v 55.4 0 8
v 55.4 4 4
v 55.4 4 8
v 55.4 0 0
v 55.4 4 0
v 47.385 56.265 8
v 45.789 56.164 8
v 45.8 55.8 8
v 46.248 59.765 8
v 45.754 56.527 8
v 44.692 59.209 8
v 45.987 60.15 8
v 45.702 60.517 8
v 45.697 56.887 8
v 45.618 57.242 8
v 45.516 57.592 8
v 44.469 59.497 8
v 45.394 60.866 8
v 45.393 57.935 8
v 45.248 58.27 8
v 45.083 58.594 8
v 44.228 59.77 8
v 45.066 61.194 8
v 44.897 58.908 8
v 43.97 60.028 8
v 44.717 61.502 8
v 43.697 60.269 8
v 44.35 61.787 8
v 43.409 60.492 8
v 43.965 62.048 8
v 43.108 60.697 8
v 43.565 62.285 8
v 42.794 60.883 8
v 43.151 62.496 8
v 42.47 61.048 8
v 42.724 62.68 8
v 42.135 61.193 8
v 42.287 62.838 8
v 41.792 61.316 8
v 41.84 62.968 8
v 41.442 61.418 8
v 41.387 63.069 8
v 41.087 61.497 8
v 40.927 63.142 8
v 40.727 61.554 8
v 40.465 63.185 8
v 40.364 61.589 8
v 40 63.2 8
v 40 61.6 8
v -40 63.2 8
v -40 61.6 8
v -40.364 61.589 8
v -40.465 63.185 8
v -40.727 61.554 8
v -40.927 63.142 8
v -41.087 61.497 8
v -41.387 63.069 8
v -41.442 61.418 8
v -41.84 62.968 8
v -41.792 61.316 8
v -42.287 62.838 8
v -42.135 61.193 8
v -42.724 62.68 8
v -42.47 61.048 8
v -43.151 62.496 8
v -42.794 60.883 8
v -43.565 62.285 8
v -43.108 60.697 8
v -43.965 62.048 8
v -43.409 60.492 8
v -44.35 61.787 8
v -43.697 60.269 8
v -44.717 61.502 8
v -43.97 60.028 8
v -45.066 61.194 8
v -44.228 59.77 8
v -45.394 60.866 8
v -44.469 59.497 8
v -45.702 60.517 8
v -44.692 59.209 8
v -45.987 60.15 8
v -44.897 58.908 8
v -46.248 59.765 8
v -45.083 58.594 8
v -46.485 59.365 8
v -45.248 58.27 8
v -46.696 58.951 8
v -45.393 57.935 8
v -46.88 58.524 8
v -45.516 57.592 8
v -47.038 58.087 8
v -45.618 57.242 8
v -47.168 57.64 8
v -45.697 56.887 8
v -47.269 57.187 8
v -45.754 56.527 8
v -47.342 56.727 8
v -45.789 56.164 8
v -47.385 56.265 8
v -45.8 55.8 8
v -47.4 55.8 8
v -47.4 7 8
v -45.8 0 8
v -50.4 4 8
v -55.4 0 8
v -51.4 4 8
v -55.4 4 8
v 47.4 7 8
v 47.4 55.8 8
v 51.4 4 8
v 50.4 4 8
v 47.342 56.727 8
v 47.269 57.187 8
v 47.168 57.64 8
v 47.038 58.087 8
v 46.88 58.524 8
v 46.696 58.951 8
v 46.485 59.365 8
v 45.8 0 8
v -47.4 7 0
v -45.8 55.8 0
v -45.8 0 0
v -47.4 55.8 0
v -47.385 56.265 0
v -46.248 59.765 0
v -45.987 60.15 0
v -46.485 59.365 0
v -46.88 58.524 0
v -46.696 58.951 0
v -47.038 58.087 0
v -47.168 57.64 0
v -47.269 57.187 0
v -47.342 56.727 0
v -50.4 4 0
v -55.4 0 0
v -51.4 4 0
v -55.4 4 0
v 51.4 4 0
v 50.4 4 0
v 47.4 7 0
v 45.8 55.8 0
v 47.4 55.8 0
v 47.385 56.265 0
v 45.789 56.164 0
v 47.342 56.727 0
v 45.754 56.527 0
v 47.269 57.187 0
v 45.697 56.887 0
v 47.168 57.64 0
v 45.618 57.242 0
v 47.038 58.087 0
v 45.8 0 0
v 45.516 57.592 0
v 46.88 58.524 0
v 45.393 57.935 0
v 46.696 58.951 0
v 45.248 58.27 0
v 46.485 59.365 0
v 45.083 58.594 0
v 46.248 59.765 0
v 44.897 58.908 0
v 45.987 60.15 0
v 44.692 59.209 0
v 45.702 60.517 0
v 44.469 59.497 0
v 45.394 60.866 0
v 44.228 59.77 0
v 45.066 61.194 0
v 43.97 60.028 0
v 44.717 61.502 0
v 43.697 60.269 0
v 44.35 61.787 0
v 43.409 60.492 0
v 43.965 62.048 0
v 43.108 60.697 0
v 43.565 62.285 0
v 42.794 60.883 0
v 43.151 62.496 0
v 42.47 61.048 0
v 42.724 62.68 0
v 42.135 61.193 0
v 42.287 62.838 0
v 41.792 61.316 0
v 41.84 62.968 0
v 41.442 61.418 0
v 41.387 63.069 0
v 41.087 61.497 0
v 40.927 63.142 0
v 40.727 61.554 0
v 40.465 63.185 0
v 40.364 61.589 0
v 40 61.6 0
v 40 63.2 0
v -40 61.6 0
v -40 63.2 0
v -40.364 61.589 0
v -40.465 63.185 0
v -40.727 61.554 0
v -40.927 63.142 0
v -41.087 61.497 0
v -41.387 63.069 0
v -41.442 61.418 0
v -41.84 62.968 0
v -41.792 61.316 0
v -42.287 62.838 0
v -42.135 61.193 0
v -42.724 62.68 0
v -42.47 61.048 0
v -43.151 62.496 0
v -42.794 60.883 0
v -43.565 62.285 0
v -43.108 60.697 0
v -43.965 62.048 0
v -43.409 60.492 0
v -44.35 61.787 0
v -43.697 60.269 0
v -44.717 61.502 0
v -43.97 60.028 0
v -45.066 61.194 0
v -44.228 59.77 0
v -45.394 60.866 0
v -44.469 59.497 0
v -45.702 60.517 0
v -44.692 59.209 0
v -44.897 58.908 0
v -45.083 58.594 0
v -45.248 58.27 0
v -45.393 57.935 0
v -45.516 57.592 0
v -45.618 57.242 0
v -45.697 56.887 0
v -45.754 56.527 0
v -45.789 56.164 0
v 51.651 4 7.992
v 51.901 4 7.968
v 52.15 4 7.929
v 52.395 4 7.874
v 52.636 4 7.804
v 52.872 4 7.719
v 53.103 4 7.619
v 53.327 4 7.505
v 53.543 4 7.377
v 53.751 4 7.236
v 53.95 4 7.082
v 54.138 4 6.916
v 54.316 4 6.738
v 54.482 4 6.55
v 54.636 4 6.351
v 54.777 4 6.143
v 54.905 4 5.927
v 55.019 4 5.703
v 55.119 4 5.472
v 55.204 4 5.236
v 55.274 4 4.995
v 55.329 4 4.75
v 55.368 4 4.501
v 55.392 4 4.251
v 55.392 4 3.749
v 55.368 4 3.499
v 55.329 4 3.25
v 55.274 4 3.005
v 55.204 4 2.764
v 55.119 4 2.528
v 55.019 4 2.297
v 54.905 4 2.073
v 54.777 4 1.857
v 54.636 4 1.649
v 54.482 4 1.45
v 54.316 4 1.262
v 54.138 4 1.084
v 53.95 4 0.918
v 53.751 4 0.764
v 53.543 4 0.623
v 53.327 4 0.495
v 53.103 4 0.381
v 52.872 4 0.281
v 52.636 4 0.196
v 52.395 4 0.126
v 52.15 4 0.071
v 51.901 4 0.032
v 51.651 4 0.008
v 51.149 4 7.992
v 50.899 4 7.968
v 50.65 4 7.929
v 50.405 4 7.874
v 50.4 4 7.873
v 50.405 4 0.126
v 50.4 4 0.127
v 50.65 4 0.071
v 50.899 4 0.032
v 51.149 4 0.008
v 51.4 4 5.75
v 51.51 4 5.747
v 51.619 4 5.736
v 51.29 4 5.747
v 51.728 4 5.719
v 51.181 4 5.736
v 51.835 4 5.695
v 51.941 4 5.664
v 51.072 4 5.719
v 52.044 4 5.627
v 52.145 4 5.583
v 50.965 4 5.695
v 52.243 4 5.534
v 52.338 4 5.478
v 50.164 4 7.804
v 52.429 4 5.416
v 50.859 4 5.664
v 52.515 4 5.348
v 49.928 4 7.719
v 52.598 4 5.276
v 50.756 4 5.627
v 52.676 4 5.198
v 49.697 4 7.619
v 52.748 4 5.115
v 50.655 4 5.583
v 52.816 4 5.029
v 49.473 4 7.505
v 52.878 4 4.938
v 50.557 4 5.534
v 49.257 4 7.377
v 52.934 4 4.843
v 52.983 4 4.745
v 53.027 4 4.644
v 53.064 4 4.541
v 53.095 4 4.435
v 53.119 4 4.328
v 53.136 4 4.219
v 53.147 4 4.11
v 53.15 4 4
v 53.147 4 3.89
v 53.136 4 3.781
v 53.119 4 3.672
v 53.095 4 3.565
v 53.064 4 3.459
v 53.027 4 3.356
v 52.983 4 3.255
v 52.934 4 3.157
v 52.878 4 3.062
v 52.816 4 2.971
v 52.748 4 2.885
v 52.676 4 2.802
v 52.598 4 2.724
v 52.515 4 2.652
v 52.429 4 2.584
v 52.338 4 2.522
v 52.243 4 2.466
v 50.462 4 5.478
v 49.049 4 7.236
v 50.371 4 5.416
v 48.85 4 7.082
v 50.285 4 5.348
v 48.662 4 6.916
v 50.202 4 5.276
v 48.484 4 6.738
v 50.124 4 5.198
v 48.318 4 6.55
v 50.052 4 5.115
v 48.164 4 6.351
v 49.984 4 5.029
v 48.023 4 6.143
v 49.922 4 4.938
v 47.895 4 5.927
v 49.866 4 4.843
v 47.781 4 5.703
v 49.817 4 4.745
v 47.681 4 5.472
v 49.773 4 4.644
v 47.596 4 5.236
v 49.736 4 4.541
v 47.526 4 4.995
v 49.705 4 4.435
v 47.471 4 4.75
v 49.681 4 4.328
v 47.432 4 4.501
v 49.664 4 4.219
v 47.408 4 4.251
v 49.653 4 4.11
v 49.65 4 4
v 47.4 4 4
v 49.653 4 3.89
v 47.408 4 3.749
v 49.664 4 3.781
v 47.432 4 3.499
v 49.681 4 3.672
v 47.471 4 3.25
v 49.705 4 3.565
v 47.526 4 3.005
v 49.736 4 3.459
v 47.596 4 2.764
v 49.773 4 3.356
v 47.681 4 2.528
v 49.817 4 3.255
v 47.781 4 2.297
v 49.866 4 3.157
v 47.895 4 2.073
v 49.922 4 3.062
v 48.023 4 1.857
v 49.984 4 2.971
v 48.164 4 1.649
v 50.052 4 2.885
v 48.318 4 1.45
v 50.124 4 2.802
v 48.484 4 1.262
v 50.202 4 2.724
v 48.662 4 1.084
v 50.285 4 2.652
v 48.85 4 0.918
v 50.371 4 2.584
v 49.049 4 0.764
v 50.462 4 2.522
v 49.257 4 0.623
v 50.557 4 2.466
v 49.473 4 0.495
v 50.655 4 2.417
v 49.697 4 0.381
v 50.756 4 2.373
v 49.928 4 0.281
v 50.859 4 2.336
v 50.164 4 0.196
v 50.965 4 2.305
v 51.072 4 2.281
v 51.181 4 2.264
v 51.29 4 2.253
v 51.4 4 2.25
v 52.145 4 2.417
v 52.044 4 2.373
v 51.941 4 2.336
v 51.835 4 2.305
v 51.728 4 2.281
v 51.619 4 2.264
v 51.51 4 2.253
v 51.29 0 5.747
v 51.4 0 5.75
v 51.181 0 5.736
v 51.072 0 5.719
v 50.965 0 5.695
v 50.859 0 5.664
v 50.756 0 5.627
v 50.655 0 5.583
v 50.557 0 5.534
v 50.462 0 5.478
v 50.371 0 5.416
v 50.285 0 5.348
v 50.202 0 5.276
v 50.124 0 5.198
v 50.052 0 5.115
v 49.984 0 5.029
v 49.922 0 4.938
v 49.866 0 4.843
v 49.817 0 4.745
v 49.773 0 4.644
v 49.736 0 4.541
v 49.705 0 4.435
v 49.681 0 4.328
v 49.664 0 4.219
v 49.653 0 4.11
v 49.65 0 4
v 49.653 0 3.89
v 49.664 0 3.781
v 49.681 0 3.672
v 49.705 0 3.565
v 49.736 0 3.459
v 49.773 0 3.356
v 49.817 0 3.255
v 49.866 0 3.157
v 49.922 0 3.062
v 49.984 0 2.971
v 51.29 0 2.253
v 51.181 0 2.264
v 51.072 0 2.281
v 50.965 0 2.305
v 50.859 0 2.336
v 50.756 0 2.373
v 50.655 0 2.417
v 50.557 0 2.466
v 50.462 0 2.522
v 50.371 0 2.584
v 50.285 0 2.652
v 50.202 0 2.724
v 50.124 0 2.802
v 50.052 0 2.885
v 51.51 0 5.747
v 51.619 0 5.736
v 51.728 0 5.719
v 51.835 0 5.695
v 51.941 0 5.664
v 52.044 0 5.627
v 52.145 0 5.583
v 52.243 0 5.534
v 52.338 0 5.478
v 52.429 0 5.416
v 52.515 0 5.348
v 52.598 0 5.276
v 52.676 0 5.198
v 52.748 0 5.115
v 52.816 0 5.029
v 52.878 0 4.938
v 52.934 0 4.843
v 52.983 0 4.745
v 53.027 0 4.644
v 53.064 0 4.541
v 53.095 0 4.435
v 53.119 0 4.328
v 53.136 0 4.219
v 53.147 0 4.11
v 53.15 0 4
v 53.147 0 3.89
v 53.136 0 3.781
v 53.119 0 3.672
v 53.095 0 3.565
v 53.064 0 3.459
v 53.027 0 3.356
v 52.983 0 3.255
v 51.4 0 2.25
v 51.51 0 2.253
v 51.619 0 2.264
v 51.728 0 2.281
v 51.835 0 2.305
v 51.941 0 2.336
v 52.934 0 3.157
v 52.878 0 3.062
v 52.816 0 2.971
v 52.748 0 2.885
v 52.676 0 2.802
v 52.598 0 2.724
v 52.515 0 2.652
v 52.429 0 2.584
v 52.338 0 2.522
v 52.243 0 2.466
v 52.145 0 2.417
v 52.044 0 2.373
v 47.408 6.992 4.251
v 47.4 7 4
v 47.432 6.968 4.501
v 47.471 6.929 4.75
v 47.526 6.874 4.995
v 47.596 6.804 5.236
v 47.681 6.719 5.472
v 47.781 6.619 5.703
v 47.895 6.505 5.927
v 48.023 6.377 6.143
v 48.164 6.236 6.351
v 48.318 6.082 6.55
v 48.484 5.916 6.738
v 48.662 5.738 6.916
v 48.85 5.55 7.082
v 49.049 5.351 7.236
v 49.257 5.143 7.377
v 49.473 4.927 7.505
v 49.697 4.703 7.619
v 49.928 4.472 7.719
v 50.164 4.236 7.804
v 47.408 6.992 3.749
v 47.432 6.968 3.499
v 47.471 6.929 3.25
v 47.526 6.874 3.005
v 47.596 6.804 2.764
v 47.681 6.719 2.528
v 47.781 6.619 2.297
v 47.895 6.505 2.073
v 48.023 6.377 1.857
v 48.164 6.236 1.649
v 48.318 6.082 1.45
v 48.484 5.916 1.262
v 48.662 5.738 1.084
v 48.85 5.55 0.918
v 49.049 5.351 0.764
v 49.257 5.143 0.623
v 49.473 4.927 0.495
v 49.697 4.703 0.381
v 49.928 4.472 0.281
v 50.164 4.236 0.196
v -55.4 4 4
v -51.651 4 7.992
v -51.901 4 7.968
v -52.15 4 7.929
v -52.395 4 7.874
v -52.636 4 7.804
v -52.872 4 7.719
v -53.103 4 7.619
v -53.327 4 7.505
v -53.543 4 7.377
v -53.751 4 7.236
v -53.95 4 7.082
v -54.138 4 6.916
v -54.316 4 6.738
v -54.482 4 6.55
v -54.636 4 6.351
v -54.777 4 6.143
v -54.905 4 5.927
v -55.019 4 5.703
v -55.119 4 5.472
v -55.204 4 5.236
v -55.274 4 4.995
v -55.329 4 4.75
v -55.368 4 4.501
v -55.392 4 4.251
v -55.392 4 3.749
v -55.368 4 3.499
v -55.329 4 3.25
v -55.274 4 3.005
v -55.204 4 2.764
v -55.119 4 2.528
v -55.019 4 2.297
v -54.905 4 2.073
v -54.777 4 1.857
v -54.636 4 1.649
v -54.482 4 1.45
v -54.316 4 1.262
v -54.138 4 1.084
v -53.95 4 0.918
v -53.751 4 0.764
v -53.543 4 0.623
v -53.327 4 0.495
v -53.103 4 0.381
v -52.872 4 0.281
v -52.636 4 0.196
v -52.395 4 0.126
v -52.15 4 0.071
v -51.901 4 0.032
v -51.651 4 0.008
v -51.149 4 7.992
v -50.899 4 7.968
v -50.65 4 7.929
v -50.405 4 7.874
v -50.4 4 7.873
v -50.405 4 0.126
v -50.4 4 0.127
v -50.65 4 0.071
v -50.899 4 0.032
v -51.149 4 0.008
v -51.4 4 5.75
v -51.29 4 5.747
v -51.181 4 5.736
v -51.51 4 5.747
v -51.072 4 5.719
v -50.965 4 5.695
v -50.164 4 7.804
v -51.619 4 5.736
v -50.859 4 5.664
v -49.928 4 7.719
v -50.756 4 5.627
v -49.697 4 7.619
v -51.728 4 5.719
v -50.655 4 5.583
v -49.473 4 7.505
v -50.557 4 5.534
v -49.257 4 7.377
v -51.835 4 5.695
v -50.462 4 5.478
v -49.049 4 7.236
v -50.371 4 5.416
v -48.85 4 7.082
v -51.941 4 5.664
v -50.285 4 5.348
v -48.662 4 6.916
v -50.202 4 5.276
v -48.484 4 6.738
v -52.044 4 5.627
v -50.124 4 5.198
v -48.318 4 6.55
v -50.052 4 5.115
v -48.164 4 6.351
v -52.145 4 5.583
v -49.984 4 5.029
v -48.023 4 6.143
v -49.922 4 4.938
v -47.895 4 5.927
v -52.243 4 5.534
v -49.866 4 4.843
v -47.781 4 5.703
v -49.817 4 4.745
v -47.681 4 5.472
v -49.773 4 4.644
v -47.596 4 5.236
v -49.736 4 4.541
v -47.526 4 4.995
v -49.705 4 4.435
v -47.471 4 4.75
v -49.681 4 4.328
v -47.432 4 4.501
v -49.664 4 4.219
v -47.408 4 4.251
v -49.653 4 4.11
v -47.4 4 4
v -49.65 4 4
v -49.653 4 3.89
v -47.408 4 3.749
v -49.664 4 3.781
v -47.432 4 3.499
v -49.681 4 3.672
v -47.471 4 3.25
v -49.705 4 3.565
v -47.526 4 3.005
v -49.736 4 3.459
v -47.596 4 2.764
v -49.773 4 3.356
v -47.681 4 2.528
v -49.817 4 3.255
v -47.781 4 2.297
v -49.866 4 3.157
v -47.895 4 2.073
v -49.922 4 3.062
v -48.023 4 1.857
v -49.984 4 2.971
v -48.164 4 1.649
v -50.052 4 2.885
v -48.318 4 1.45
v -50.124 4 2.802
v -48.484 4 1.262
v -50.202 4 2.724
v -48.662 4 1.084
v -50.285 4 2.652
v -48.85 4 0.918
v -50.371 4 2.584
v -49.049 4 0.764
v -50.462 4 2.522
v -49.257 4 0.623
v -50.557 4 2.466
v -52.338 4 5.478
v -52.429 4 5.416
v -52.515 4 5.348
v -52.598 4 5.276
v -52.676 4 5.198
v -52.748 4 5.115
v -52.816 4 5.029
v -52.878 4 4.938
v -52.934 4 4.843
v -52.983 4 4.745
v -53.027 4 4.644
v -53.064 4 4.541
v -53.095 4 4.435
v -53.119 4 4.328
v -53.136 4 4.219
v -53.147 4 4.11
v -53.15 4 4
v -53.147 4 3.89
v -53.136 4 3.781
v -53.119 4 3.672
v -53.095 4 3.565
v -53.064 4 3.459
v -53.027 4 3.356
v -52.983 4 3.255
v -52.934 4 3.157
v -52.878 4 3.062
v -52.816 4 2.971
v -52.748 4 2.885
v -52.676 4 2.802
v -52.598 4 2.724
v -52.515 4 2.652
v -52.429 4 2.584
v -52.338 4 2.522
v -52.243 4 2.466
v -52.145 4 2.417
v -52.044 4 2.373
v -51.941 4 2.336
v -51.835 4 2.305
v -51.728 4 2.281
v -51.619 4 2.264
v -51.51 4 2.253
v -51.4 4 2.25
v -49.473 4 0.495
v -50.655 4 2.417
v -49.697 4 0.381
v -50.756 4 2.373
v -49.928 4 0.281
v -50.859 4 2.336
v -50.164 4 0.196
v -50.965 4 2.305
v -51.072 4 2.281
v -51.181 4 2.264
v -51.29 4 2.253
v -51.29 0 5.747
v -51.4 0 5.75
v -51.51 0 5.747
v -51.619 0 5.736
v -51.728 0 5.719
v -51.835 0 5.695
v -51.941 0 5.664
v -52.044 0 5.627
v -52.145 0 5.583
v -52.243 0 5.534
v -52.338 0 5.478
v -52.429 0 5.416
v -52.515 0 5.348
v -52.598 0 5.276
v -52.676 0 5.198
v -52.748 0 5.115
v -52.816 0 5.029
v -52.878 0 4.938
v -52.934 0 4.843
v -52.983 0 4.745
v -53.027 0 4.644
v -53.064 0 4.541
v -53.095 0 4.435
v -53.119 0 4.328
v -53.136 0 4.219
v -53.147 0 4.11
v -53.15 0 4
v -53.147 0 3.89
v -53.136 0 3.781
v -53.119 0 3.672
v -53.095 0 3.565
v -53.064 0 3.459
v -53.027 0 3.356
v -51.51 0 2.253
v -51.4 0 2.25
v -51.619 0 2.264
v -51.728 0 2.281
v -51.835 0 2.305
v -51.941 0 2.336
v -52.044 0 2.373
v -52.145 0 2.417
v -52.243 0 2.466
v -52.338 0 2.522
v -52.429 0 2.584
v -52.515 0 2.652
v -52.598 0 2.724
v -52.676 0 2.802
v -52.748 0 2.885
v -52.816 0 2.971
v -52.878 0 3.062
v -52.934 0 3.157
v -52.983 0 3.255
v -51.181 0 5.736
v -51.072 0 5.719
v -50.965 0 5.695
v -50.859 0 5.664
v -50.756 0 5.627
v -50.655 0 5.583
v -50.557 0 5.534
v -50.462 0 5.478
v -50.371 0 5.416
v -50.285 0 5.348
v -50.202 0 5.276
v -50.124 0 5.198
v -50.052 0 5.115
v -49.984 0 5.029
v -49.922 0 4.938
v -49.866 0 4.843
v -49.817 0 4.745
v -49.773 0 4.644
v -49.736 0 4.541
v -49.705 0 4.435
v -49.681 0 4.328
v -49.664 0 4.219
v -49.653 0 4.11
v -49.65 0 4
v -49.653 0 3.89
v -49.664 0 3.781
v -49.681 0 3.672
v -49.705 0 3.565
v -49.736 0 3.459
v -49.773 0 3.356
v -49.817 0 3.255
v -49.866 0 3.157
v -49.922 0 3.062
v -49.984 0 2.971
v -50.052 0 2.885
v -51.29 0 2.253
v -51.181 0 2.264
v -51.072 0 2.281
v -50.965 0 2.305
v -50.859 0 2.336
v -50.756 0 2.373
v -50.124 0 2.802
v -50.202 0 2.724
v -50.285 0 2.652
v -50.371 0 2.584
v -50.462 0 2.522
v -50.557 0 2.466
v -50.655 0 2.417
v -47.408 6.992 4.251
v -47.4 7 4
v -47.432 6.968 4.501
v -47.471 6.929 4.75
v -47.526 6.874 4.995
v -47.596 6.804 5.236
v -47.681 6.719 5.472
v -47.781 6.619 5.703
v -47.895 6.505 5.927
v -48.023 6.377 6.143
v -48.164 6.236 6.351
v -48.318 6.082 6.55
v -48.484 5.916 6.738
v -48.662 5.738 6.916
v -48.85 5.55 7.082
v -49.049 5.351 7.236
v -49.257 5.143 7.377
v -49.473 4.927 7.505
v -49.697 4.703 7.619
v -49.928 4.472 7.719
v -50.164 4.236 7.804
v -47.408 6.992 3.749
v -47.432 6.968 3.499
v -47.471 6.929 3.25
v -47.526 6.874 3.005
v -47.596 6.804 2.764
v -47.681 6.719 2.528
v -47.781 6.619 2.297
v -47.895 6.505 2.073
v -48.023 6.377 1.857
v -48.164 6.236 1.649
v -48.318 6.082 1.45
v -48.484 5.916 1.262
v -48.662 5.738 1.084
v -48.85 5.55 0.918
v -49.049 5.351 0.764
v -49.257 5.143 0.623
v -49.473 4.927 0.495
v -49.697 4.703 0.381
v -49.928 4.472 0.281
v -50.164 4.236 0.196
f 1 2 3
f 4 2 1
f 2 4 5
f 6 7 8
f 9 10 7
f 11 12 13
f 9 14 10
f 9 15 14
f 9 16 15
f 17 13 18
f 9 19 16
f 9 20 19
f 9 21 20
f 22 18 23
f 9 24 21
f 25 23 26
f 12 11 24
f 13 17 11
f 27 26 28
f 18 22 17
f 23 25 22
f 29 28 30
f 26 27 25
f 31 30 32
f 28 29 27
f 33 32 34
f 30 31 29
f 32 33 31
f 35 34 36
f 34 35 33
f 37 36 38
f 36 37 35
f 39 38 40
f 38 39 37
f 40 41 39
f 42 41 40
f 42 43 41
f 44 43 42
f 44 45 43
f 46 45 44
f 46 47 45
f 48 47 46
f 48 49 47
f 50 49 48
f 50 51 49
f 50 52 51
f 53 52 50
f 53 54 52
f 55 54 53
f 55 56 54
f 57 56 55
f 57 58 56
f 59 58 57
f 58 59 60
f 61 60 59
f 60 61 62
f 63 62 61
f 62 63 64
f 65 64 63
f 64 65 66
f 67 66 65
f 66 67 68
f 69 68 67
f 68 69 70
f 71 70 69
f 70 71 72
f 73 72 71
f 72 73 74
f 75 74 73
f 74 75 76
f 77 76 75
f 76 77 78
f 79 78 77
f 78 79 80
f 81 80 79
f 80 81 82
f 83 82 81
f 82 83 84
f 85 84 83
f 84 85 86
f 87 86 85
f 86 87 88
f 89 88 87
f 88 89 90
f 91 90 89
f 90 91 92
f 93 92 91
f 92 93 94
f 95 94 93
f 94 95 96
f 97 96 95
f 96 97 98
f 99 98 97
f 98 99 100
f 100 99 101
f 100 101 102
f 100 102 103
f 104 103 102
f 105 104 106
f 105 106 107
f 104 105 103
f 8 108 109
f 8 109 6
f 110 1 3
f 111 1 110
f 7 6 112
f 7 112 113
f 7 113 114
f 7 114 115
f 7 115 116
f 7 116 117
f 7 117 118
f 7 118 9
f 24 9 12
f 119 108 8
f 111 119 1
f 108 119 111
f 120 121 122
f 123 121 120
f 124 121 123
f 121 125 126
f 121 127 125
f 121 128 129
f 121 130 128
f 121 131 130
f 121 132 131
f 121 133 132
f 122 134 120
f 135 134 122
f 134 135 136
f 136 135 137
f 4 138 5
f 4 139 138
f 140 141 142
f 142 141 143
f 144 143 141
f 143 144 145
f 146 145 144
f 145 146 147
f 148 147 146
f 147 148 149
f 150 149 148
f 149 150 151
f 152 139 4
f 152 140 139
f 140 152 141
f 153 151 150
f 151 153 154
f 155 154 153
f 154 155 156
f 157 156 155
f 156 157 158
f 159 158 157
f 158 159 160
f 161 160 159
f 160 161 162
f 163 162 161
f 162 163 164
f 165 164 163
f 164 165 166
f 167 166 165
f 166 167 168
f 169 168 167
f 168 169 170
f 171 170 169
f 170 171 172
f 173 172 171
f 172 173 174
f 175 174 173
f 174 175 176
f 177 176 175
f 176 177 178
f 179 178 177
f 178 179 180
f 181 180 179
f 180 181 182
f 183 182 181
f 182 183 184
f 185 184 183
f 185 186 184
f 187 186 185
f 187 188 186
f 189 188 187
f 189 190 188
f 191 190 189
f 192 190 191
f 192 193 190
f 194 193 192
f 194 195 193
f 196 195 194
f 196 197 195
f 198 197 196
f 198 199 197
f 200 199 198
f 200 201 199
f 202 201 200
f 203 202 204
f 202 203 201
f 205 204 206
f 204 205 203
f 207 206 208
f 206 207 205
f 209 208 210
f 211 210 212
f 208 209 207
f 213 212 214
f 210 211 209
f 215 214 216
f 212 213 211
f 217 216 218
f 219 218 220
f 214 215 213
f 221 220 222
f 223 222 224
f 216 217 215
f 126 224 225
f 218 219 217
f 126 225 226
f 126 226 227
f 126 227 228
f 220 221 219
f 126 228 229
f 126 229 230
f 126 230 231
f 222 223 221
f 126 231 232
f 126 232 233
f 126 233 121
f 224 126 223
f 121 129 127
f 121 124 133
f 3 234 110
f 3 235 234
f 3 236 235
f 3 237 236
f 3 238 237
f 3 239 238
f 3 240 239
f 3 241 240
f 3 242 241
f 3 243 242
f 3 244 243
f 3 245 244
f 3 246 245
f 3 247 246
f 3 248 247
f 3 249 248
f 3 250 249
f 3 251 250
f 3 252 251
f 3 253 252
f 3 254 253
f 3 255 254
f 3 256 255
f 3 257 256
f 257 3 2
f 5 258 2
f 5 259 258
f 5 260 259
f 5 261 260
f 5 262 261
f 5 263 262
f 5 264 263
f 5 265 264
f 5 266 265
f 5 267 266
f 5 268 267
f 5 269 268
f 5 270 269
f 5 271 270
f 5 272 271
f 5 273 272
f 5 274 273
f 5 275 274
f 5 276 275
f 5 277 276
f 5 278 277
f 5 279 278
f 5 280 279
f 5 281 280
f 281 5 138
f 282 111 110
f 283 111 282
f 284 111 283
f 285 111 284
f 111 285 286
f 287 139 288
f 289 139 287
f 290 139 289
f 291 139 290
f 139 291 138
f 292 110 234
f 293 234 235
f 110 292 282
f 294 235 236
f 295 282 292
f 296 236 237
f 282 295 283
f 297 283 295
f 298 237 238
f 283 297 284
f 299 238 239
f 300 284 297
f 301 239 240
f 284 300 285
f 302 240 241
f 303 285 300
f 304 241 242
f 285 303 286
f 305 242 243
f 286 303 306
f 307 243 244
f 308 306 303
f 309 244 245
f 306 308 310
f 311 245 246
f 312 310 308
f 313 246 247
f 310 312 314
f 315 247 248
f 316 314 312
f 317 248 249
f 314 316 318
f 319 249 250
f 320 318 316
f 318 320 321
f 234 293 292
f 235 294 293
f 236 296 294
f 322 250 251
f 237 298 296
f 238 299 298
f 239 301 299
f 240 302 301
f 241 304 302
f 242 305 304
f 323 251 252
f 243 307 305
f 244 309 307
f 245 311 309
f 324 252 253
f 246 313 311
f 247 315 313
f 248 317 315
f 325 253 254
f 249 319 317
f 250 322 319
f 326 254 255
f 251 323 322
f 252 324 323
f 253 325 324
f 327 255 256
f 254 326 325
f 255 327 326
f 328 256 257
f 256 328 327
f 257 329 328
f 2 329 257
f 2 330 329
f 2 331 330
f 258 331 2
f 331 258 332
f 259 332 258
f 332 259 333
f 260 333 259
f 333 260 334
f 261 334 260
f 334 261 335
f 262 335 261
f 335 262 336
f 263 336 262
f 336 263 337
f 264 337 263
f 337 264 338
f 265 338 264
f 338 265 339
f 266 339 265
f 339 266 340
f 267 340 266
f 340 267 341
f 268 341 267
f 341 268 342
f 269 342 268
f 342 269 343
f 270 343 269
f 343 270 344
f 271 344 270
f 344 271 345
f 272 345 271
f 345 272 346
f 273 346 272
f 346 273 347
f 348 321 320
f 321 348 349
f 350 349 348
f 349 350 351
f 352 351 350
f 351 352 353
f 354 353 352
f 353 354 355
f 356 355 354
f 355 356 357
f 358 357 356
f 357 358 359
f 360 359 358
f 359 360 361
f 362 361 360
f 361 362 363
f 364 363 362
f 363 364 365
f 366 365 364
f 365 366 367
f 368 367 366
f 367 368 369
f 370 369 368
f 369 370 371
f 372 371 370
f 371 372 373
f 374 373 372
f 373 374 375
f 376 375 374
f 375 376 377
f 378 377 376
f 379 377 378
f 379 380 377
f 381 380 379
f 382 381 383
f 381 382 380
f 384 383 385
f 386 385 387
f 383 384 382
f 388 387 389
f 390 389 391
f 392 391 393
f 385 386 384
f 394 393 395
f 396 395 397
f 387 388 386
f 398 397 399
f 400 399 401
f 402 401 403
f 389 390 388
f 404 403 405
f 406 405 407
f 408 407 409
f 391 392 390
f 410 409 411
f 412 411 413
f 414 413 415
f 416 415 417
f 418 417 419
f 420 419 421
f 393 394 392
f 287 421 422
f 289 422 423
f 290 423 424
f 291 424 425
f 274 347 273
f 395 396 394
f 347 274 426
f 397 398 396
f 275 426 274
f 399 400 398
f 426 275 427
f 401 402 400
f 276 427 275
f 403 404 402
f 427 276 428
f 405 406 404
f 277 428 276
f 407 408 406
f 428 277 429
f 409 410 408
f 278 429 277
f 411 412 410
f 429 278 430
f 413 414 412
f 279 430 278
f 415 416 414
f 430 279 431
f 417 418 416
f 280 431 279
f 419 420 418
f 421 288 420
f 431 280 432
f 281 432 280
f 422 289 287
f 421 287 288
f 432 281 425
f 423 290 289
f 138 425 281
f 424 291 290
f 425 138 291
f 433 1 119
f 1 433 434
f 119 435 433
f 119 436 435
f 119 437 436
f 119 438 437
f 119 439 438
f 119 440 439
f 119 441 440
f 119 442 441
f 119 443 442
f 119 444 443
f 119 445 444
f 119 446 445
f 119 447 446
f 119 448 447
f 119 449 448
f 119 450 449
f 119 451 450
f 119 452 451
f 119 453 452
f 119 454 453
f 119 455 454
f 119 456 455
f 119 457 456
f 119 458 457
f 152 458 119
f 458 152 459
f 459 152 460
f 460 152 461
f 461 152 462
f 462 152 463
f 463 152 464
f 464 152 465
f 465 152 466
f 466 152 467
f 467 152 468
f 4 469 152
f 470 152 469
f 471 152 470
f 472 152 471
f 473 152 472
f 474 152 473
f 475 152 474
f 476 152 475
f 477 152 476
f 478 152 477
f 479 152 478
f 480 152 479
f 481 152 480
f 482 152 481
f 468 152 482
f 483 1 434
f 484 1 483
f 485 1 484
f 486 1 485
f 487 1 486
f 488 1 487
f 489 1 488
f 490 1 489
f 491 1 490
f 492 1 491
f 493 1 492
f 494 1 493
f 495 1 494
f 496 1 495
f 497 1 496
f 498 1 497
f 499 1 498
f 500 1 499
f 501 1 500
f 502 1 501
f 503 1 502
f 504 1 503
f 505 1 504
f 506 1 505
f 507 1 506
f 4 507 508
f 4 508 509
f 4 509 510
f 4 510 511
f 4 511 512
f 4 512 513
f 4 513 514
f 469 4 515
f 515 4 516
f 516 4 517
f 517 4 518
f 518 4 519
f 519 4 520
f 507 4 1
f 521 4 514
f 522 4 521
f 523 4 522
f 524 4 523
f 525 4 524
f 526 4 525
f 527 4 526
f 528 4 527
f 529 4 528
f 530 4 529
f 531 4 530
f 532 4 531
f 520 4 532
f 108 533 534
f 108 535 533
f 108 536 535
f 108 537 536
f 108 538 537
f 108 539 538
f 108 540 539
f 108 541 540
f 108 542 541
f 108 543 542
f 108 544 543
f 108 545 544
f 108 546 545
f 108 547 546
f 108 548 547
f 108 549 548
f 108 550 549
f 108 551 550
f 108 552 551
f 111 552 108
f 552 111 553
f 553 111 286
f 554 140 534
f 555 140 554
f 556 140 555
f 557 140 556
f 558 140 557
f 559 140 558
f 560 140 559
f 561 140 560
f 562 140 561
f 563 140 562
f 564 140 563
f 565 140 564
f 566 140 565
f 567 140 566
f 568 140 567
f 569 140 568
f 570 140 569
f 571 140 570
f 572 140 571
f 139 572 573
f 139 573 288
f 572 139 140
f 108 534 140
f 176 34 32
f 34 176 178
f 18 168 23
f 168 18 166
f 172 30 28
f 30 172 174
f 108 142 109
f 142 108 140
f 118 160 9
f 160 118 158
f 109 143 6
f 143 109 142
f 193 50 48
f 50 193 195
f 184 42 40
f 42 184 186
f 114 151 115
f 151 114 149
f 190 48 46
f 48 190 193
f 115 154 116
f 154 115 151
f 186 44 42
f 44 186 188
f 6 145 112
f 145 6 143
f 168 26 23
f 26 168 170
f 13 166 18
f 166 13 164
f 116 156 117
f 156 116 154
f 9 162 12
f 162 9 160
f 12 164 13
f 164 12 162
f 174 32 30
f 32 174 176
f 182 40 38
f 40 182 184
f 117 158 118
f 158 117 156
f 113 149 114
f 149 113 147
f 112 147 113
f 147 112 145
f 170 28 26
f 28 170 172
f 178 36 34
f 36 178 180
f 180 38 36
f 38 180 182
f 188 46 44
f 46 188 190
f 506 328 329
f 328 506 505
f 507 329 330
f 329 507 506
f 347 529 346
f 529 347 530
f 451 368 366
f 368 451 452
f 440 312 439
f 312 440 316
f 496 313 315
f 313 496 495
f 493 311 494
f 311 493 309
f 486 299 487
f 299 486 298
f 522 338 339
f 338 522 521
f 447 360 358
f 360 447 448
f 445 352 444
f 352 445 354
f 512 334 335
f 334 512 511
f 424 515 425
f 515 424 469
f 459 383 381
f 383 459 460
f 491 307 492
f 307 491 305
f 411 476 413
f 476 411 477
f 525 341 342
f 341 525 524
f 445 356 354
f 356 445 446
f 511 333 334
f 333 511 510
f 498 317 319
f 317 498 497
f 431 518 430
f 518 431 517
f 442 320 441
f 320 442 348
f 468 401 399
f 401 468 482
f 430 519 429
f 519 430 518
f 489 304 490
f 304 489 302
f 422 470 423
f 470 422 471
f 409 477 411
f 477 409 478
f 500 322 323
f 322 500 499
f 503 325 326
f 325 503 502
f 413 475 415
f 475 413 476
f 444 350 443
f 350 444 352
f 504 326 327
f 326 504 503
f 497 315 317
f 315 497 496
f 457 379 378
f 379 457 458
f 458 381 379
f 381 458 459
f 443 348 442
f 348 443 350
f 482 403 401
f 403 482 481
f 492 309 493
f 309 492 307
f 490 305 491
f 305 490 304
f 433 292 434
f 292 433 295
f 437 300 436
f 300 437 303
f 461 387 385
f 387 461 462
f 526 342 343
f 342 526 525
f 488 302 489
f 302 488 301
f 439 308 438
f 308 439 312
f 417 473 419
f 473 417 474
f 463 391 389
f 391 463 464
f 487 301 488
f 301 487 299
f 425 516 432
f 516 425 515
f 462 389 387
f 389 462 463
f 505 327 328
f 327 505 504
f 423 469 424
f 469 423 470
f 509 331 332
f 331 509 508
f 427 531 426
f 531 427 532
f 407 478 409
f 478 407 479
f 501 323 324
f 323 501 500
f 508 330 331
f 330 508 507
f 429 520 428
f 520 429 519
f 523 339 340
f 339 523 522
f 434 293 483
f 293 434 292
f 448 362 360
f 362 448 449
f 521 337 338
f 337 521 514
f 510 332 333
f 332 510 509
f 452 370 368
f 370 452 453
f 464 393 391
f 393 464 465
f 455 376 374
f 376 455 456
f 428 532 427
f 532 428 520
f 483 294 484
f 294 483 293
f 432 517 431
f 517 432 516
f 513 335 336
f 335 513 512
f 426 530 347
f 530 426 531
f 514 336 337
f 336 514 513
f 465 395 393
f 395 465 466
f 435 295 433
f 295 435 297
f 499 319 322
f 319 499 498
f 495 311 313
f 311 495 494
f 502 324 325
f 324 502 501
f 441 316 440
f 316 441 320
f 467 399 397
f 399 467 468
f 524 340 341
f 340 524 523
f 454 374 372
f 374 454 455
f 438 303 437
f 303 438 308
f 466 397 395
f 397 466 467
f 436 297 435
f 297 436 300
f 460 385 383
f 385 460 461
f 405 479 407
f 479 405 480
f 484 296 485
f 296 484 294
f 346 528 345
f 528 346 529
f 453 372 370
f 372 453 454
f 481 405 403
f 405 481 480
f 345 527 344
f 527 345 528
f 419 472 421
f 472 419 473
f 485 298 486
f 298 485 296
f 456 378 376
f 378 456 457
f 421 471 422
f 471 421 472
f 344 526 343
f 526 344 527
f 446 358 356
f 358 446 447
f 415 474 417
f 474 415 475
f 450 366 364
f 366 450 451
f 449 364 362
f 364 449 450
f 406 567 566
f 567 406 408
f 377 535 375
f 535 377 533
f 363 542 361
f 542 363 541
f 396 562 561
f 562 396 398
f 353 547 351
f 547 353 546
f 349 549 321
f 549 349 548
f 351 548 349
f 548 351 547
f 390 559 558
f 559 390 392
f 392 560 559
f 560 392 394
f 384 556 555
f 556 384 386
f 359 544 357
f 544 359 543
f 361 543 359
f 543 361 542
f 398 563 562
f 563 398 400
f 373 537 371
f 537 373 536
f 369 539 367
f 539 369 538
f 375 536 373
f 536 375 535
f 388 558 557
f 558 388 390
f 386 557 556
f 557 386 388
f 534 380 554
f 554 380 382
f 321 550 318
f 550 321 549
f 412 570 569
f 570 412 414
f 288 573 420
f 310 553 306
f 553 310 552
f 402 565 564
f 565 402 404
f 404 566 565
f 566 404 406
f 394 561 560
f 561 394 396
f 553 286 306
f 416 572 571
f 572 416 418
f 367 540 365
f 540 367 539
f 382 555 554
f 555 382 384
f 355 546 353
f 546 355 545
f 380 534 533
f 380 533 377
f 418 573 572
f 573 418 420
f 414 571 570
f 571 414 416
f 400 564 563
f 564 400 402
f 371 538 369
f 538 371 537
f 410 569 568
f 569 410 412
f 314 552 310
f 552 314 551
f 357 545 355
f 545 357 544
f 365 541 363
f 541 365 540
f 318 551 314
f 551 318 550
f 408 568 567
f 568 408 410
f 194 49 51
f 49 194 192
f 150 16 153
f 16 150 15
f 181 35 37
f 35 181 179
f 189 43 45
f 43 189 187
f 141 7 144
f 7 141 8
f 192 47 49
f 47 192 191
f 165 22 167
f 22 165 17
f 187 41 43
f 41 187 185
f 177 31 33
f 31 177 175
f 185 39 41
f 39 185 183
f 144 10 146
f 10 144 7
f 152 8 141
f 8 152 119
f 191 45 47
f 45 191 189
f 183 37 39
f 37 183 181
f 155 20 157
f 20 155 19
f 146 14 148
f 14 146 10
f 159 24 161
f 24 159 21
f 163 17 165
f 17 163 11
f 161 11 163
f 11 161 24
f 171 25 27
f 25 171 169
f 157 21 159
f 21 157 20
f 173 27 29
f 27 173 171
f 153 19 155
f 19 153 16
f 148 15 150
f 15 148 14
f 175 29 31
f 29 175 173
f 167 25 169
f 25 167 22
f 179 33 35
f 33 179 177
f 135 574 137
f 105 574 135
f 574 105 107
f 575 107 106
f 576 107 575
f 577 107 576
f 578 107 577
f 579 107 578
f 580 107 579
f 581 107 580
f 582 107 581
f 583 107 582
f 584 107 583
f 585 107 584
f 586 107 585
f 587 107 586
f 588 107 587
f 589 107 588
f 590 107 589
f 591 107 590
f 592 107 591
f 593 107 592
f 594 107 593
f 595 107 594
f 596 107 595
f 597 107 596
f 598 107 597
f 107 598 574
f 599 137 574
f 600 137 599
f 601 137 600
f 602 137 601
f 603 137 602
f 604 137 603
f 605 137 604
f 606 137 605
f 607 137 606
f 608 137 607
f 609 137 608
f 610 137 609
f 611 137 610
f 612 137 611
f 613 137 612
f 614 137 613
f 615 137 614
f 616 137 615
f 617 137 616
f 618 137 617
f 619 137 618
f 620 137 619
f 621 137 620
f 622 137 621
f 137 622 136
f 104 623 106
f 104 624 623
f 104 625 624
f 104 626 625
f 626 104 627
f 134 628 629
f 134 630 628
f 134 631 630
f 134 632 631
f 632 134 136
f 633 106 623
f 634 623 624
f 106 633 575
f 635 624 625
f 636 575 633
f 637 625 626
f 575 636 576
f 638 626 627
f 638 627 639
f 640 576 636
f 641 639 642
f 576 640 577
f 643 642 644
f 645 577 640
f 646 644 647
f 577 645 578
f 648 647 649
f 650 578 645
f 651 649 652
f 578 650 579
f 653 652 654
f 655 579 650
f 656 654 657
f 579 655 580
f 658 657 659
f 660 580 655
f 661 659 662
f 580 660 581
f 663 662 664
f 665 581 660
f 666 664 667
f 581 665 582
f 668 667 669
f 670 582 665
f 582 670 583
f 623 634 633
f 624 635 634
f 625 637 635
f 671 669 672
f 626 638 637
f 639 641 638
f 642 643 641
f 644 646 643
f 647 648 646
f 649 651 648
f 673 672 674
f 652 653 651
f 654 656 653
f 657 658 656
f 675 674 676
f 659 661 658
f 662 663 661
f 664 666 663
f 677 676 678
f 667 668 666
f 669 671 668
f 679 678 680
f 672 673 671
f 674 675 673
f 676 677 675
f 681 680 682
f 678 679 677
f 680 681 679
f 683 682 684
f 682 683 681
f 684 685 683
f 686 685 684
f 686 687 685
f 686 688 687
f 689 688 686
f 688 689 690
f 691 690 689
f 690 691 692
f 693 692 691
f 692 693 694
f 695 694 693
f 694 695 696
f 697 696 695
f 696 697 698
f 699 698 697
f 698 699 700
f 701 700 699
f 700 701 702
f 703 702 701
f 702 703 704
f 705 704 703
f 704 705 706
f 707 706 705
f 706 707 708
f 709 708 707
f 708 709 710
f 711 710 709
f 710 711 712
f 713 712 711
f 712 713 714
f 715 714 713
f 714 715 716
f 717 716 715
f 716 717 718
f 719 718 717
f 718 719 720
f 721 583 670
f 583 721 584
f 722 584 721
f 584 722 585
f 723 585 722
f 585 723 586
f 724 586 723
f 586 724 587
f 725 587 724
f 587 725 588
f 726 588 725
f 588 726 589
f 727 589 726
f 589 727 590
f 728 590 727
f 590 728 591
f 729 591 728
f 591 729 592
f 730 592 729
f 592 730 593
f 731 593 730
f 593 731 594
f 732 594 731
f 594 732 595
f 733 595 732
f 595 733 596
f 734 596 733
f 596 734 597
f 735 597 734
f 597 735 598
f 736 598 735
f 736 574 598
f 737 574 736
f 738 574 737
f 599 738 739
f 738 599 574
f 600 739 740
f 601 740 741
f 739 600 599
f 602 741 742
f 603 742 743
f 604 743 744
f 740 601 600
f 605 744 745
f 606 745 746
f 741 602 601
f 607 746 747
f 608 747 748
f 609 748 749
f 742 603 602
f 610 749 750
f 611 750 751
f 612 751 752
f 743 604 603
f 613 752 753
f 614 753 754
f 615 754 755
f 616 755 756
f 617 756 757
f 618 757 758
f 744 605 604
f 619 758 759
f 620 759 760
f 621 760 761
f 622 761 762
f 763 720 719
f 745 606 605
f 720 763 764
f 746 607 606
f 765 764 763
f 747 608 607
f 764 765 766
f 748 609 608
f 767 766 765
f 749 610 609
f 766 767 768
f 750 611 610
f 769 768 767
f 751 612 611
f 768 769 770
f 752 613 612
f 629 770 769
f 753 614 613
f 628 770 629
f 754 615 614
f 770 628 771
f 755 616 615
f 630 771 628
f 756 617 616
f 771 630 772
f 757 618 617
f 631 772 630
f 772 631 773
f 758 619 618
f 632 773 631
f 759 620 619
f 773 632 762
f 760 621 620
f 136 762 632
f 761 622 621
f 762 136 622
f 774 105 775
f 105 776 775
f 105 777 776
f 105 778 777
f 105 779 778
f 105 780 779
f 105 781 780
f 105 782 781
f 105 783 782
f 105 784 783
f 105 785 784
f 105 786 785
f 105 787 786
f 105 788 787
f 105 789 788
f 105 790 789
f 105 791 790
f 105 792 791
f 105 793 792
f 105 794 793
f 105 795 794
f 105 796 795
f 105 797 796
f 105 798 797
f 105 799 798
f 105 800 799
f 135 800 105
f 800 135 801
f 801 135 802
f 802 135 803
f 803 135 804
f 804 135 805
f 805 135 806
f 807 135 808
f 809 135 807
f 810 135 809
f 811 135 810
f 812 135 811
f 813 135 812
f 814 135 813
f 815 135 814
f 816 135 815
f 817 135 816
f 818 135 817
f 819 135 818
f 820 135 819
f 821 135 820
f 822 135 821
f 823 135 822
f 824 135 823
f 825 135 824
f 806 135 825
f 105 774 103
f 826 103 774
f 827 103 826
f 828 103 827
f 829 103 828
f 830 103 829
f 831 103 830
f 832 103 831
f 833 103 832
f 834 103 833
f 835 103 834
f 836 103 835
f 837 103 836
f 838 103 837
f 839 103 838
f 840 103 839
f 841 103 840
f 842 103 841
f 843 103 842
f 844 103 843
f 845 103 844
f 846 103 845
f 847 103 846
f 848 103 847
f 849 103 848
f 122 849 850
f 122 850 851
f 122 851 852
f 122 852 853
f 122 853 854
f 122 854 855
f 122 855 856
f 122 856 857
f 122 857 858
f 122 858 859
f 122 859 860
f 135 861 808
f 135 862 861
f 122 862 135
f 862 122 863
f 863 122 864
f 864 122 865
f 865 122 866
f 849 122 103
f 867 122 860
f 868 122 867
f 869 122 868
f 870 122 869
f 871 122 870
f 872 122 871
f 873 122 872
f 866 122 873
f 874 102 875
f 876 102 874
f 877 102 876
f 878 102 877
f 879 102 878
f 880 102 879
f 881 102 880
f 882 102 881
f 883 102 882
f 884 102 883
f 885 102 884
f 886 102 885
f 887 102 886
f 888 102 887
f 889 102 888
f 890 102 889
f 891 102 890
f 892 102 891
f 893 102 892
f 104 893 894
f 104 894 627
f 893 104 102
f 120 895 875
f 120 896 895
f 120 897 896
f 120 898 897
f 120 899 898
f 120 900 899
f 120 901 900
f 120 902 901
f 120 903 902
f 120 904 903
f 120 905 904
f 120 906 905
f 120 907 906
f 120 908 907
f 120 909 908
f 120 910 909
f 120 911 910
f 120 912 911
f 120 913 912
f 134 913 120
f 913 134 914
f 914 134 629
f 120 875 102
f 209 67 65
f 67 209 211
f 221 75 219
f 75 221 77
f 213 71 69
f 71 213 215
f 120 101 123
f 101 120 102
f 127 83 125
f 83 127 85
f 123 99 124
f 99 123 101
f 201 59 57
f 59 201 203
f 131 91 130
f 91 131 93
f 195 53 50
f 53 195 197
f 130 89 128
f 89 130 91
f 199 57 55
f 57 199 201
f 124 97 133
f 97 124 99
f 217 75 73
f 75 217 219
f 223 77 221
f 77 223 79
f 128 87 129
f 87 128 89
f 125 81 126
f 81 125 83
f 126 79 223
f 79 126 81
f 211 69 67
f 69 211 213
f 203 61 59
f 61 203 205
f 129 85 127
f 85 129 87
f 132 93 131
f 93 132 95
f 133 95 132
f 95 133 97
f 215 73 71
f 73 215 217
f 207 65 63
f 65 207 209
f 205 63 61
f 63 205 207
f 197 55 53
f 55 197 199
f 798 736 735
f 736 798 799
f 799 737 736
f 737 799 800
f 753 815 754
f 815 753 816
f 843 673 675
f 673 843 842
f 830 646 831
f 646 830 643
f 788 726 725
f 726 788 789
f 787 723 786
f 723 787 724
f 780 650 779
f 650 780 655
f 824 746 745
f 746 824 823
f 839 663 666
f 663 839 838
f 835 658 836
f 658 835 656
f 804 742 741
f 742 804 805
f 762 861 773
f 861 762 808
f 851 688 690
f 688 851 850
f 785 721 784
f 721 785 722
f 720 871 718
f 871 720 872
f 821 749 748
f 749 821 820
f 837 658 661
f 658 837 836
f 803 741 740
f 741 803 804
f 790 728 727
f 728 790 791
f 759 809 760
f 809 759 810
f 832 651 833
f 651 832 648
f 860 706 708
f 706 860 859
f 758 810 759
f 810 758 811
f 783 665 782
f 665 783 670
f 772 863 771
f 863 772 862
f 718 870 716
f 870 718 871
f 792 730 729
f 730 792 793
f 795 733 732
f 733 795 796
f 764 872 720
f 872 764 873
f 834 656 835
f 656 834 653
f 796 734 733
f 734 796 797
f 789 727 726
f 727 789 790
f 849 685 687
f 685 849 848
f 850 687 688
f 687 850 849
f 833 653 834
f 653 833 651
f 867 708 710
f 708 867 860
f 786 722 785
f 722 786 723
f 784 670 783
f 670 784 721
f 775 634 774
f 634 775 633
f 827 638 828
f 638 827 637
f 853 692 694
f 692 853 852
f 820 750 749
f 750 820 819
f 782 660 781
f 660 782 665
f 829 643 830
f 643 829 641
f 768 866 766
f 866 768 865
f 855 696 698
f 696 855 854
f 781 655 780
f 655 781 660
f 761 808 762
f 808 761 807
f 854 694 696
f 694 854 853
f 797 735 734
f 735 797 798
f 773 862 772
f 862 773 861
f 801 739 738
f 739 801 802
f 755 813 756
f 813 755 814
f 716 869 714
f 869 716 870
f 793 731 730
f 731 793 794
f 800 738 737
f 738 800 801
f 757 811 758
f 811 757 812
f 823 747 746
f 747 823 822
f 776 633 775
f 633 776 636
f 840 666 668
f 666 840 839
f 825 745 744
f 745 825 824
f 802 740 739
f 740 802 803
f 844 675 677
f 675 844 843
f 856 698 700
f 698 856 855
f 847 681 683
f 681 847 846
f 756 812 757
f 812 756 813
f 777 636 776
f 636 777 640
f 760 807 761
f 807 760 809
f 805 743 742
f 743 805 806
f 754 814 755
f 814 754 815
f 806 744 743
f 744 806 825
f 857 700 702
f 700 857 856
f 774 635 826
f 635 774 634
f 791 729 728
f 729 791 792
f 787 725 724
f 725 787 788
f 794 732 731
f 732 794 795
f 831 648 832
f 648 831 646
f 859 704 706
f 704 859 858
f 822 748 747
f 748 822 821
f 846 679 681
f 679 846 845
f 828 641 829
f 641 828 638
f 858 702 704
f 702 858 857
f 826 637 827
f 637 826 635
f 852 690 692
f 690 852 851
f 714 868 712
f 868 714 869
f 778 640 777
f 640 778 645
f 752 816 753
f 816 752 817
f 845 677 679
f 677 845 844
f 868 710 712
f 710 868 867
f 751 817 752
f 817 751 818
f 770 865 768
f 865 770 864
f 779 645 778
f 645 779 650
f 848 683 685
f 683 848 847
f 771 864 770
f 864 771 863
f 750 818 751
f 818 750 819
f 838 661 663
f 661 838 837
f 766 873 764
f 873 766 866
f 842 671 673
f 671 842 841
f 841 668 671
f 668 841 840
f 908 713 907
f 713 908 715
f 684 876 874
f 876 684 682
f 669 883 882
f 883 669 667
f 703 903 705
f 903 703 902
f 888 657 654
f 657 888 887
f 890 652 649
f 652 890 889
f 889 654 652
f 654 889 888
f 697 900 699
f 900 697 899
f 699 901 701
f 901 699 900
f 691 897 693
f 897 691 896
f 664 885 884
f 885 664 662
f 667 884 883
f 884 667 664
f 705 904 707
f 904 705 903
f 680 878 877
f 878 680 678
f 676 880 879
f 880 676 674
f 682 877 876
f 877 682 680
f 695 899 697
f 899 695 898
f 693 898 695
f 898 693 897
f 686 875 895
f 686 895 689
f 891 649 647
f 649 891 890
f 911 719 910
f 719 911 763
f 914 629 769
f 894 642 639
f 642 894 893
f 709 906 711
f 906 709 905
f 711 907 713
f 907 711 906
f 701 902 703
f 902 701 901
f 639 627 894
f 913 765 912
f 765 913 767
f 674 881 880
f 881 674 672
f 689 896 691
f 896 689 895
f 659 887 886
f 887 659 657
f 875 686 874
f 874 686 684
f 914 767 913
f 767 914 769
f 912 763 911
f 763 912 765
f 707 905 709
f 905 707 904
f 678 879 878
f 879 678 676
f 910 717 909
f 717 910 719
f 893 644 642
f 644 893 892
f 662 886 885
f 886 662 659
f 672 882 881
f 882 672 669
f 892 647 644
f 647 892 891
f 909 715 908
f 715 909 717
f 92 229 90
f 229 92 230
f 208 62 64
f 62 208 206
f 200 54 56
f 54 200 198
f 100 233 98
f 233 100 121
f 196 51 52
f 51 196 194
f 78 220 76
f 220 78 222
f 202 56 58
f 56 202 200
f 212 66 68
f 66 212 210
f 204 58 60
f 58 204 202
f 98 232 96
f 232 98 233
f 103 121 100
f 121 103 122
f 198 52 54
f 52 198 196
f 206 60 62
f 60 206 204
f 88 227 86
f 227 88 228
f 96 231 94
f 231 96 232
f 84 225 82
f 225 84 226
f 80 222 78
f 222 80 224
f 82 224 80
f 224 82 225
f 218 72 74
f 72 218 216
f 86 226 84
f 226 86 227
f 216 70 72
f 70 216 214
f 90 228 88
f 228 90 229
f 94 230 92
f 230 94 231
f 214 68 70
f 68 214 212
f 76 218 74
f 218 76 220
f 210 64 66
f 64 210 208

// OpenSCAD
/* 
AFE clamp
*/

$fn=100;

// config params:
NZ_D=0.4;				// nozzle dia
NZ_H=0.25;				// nozzle height
VERT=0;					// vertical/horizontal build switch
//
W0=(VERT)?60:90;		// basic width
L0=(VERT)?90:60;		// basic length
R0=5;						// basic radius
OSZ=NZ_D*2;				// walls oversize
W=W0+OSZ*2;				// width
L=L0+OSZ*2;				// length
R=R0+OSZ;				// radius
H=8;						// height
T=NZ_D*4;				// wall thickness
//
F_W=H+T;					// foot width
F_T=NZ_D*10;			// foot thickness
F_F=3;					// foot fillet
//
H_D=3.5;					// hole dia
H_CD=H;					// hole csink dia

module foot(){
	x = W/2+F_W/2;
	y = F_T/2;
	z = H/2;
	f = F_F*sqrt(2);
	translate([x,y,z]){
		cube([F_W,F_T,H], center=true);  // foot
		translate([T-F_W/2,F_T/2,0]) rotate([0,0,45]) cube([f,f,H], center=true);  // fillet
	}
}

module outer_wall(){
	x = W/2-R;
	y = L-R;
	hull(){
		translate([x,y,0]) cylinder(r=R+T, h=H);
		translate([0,y,0]) cylinder(r=R+T, h=H);
		translate([0,0,0]) cylinder(r=R+T, h=H);
		translate([x,0,0]) cylinder(r=R+T, h=H);
	}
}

module inner_wall(){
	x = W/2-R;
	y = L-R;
	hull(){
		translate([x,y,-0.01]) cylinder(r=R, h=H+0.02);
		translate([0,y,-0.01]) cylinder(r=R, h=H+0.02);
		translate([0,0,-0.01]) cylinder(r=R, h=H+0.02);
		translate([x,0,-0.01]) cylinder(r=R, h=H+0.02);
	}
}

module hole(){
	x = W/2+T+H/2;
	y = F_T/2;
	z = H/2;
	translate([x,y,z]){
		rotate([90,0,0]) cylinder(d=H_D, h=F_T+0.02, center=true);  // hole
		translate([0,y+F_F/2,0]) rotate([90,0,0]) cylinder(d=H_CD, h=F_F, center=true);  // csink
	}
}

module quadrant_cube(){
	cube([W/2+F_W,L+T,H]);
}


module half(){
	intersection(){
		difference(){
			union(){
				outer_wall();
				foot();
				}
			inner_wall();
			hole();
		}
		quadrant_cube();
	}
}

// render
half();
mirror([1,0,0]) half();
